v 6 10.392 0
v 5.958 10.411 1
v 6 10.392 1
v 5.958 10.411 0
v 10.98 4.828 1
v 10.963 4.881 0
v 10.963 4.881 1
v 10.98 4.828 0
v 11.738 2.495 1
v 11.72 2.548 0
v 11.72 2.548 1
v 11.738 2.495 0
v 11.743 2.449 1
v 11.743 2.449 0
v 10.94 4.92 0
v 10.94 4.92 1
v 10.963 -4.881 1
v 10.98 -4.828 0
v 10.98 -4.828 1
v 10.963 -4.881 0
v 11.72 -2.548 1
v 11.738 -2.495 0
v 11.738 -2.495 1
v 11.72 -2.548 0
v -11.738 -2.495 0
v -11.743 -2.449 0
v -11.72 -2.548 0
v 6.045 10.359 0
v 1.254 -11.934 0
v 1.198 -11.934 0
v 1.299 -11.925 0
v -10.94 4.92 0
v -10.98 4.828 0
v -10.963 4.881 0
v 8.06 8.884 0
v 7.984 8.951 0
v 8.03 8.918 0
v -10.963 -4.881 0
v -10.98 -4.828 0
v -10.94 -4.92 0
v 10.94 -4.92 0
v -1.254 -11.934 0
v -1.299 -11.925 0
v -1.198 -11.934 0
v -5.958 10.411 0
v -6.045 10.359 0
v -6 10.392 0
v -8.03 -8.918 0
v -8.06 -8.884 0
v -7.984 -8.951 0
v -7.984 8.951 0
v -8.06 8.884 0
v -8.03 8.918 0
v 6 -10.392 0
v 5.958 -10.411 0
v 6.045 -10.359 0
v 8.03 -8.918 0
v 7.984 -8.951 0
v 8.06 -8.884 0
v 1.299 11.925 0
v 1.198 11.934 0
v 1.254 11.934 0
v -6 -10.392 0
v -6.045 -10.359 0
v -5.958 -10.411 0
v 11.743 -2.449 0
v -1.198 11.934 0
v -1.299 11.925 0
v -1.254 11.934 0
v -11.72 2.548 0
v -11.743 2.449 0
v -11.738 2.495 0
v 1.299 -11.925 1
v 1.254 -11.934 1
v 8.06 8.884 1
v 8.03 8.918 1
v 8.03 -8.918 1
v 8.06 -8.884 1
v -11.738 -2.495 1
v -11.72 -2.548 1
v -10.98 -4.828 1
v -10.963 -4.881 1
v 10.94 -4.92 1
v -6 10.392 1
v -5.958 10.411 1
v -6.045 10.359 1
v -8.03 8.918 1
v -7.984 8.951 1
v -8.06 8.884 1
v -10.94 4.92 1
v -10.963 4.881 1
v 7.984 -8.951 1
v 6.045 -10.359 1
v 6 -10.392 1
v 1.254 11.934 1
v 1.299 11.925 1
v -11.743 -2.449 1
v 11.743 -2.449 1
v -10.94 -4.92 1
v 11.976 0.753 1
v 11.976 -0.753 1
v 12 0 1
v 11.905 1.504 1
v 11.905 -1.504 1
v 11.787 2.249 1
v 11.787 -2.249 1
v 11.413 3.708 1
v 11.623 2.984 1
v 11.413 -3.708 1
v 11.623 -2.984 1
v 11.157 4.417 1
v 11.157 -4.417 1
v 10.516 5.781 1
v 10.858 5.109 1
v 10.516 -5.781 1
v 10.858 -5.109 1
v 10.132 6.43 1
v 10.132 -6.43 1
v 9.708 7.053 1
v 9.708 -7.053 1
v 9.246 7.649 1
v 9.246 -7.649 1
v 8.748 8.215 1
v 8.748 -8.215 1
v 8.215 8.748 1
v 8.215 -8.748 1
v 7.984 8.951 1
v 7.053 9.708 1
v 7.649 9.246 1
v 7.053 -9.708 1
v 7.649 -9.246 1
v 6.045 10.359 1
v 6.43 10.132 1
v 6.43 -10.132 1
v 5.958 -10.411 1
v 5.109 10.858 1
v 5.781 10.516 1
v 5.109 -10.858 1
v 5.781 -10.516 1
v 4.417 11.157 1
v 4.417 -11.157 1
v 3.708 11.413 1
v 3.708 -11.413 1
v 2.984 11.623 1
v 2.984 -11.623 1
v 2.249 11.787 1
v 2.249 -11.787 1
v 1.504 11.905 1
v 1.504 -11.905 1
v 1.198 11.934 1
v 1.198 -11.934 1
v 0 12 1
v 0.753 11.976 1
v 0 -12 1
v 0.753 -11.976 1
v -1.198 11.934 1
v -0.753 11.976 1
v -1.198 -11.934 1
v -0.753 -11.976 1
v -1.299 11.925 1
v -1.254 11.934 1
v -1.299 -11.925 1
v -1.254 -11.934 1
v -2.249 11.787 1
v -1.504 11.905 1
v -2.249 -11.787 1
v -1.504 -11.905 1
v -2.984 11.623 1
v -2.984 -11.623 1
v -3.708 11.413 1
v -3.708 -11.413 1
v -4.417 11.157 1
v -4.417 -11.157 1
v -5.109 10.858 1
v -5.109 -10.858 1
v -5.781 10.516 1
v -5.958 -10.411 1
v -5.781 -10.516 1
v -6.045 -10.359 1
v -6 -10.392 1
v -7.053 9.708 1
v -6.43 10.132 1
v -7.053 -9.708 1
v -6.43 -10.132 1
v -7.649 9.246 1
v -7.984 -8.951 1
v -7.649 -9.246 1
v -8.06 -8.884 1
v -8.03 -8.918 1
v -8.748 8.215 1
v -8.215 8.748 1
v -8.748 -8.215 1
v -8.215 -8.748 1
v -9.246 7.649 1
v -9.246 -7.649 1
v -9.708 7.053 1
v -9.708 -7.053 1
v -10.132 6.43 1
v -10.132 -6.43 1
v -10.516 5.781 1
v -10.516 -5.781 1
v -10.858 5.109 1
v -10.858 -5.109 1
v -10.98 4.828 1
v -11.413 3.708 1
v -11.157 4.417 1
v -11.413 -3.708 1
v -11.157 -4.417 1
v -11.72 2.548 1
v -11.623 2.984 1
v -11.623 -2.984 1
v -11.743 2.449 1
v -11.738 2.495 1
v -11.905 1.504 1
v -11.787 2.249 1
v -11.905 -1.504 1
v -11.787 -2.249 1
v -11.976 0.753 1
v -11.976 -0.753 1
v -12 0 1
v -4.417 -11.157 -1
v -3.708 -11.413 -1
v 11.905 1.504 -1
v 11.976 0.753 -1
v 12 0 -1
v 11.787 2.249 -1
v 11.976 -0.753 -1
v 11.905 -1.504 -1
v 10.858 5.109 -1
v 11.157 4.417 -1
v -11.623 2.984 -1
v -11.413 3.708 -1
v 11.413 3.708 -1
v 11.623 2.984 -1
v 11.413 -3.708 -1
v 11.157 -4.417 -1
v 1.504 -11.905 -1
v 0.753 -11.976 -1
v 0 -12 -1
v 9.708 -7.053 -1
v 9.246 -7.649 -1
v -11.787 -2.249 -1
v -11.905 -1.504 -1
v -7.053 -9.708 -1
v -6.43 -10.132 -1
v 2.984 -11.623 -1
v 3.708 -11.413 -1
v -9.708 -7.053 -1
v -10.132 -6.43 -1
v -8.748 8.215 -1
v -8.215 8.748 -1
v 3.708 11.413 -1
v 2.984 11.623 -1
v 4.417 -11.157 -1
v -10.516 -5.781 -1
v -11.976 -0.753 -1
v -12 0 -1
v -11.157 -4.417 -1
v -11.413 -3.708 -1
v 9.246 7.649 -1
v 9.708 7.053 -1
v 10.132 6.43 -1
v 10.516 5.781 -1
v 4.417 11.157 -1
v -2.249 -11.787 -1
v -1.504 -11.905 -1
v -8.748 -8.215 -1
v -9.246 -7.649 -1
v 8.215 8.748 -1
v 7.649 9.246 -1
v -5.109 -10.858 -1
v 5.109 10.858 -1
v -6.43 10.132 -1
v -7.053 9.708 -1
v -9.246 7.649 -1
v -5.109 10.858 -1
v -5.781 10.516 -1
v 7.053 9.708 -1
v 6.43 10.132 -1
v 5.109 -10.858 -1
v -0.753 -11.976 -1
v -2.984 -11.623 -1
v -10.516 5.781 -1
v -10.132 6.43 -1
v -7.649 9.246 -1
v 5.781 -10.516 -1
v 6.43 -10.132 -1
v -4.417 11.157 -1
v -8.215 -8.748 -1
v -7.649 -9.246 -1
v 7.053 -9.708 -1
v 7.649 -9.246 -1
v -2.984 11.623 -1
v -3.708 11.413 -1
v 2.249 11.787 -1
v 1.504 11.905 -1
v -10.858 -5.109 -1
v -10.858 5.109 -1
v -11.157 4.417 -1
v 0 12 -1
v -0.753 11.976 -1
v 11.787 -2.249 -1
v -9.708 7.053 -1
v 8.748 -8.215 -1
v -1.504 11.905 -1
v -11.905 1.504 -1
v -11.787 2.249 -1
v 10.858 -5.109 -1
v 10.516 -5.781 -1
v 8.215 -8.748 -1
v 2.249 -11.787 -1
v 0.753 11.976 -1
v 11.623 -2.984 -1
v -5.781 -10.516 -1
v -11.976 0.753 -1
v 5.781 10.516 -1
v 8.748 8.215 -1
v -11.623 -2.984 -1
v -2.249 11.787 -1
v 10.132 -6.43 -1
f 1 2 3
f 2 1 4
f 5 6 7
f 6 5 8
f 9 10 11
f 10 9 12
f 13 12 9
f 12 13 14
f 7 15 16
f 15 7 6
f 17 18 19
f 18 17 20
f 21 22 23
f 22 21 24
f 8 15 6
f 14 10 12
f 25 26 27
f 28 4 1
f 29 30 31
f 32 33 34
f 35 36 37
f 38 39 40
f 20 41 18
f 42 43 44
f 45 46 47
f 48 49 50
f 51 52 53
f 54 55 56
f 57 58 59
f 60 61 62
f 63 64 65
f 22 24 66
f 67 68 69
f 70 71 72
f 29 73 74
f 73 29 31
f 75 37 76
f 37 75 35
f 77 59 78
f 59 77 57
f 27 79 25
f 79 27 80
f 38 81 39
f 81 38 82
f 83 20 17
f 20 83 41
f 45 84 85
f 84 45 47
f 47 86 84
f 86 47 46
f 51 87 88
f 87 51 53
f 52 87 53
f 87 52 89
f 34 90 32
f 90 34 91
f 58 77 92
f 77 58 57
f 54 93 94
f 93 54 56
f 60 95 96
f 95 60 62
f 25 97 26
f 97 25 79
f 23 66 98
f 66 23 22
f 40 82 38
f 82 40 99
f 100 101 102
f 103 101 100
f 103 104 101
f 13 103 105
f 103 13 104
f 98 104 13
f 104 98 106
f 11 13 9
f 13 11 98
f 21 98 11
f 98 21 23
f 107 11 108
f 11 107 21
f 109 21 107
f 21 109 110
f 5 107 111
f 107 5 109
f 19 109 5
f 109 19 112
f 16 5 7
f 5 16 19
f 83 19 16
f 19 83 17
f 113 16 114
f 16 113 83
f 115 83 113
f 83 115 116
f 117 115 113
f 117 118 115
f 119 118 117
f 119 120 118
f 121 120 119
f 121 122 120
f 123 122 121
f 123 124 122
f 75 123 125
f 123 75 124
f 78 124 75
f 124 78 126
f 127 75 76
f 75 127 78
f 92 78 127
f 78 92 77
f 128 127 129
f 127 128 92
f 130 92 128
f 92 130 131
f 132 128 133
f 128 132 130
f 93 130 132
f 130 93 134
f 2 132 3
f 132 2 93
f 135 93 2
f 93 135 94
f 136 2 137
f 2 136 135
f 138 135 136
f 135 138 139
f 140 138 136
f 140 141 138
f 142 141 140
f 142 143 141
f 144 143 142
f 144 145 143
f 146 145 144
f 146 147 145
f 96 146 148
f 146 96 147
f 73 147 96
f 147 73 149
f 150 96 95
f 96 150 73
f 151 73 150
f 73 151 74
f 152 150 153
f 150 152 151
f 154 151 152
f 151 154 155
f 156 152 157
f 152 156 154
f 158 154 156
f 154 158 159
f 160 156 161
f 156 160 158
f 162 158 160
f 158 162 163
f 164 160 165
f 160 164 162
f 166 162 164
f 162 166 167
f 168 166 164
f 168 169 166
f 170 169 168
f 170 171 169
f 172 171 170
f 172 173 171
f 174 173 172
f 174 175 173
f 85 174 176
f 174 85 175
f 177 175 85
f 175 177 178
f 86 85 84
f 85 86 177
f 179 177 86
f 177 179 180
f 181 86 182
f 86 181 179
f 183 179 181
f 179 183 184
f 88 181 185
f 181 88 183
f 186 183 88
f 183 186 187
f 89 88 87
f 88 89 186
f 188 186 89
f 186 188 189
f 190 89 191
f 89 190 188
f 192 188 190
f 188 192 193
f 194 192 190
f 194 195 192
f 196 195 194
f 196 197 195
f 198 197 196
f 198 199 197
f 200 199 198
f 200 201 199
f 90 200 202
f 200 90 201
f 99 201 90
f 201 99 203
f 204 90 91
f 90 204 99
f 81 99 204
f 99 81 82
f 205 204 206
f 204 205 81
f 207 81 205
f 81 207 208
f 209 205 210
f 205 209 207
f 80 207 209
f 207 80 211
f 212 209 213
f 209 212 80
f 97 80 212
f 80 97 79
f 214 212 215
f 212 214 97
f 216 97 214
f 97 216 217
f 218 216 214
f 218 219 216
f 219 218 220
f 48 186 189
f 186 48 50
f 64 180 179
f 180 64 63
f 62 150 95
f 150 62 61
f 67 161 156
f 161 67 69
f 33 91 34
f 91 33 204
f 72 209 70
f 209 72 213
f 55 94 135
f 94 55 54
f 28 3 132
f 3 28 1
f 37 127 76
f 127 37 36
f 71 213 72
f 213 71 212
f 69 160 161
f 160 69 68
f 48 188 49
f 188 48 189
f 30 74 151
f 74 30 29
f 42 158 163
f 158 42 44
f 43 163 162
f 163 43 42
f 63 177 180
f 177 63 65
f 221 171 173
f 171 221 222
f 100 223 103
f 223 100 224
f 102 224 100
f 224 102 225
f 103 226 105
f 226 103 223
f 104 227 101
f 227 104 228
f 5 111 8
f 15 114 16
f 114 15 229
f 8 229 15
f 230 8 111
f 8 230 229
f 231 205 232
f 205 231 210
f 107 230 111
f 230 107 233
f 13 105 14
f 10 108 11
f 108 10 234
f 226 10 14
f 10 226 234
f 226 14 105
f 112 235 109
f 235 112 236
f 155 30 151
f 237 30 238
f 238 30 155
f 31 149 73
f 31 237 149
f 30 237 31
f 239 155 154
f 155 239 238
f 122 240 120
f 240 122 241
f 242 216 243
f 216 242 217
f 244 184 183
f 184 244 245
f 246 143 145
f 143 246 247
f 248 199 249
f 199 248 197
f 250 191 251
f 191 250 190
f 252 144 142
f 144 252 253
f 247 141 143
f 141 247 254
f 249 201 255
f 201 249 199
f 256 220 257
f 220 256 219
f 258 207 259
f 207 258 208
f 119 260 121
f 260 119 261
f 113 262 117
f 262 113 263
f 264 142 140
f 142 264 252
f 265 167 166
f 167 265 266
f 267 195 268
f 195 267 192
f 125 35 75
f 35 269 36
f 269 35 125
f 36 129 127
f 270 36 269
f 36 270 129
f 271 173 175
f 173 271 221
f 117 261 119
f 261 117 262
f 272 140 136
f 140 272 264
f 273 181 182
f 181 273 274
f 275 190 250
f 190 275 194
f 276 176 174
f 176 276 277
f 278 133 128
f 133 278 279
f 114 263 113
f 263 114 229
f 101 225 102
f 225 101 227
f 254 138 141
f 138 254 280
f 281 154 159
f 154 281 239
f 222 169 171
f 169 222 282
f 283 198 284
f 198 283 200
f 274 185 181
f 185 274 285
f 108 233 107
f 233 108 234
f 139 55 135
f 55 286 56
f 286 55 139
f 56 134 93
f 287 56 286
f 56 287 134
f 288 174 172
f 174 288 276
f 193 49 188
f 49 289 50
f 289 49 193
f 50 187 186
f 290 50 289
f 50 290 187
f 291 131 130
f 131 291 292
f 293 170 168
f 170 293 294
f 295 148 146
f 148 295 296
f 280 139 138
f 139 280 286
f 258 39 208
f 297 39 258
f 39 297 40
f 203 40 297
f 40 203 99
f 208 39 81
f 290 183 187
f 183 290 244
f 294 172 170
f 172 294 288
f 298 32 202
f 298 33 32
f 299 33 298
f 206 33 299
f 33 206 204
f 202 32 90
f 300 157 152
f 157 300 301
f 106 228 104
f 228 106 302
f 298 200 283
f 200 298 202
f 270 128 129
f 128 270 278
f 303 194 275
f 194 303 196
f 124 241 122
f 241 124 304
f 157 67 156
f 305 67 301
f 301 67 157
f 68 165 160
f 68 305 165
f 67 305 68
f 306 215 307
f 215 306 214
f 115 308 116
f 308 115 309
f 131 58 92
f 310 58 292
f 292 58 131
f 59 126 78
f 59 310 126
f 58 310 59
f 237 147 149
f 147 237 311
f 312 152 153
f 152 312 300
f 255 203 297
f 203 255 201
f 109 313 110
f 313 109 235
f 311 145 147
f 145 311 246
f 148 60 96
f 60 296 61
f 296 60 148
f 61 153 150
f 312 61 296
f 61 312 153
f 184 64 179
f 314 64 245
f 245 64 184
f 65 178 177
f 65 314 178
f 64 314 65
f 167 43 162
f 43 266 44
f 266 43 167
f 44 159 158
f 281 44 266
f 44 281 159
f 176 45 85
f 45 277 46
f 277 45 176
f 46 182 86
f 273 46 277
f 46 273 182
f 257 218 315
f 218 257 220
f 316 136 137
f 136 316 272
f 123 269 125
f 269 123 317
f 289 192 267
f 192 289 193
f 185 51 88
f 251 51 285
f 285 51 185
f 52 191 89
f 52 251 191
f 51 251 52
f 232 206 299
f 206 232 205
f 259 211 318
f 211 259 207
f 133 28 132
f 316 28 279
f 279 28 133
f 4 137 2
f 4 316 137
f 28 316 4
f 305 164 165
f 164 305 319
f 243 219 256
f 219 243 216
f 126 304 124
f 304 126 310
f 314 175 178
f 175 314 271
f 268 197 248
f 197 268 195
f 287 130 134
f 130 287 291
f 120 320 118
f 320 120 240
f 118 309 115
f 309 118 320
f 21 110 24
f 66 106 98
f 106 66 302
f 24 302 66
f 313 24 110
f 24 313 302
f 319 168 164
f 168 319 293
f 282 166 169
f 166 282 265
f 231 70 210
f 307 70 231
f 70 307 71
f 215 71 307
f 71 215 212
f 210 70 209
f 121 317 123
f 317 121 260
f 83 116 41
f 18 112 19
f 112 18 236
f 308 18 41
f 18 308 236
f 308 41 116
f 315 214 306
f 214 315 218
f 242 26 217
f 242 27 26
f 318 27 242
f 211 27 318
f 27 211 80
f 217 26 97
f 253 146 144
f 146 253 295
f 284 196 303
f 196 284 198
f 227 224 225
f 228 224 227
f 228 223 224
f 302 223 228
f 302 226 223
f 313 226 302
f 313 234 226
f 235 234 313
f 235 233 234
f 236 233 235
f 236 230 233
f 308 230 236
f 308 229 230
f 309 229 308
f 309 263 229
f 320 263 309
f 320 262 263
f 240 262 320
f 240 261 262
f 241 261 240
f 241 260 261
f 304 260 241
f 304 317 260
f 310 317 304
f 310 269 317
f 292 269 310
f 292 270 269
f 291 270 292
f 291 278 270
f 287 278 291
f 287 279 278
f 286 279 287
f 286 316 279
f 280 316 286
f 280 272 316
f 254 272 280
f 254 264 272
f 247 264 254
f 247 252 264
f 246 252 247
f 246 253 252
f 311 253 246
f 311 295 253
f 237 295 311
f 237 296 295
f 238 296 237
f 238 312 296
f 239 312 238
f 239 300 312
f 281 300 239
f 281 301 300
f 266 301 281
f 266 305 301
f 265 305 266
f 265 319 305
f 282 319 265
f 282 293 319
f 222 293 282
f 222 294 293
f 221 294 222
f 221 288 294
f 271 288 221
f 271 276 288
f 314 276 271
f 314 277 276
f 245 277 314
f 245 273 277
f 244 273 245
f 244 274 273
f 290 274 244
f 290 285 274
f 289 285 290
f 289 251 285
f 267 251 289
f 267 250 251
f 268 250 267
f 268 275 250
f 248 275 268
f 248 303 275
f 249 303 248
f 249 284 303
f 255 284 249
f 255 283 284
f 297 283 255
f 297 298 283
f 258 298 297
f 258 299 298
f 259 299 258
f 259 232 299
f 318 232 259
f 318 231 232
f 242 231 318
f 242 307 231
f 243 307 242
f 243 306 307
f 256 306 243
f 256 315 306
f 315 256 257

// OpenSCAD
// Set to your DXF file
profile_file = "kamila.dxf";
// Adjust scale and x/y offsets so profile is centered inside the coin
profile_scale = 0.07;
profile_offset_x = -16;
profile_offset_y = -9;
profile_width = 1;
coin_radius = 12;
coin_width = 1;
brim_radius = 1;

module profile(file) {
	scale(profile_scale)
		linear_extrude(height=1/profile_scale + 1)
			import(file, center=true);
}

difference() {
	cylinder(h=profile_width, r=coin_radius);
	translate([profile_offset_x, profile_offset_y, 0])
		profile(profile_file);
}

translate([0, 0, -coin_width])
	cylinder(h=coin_width, r=coin_radius, $fn=100);

difference() {
	cylinder(h=coin_width, r=coin_radius, $fn=100);
	cylinder(h=coin_width, r=coin_radius-brim_radius, $fn=100);
}
